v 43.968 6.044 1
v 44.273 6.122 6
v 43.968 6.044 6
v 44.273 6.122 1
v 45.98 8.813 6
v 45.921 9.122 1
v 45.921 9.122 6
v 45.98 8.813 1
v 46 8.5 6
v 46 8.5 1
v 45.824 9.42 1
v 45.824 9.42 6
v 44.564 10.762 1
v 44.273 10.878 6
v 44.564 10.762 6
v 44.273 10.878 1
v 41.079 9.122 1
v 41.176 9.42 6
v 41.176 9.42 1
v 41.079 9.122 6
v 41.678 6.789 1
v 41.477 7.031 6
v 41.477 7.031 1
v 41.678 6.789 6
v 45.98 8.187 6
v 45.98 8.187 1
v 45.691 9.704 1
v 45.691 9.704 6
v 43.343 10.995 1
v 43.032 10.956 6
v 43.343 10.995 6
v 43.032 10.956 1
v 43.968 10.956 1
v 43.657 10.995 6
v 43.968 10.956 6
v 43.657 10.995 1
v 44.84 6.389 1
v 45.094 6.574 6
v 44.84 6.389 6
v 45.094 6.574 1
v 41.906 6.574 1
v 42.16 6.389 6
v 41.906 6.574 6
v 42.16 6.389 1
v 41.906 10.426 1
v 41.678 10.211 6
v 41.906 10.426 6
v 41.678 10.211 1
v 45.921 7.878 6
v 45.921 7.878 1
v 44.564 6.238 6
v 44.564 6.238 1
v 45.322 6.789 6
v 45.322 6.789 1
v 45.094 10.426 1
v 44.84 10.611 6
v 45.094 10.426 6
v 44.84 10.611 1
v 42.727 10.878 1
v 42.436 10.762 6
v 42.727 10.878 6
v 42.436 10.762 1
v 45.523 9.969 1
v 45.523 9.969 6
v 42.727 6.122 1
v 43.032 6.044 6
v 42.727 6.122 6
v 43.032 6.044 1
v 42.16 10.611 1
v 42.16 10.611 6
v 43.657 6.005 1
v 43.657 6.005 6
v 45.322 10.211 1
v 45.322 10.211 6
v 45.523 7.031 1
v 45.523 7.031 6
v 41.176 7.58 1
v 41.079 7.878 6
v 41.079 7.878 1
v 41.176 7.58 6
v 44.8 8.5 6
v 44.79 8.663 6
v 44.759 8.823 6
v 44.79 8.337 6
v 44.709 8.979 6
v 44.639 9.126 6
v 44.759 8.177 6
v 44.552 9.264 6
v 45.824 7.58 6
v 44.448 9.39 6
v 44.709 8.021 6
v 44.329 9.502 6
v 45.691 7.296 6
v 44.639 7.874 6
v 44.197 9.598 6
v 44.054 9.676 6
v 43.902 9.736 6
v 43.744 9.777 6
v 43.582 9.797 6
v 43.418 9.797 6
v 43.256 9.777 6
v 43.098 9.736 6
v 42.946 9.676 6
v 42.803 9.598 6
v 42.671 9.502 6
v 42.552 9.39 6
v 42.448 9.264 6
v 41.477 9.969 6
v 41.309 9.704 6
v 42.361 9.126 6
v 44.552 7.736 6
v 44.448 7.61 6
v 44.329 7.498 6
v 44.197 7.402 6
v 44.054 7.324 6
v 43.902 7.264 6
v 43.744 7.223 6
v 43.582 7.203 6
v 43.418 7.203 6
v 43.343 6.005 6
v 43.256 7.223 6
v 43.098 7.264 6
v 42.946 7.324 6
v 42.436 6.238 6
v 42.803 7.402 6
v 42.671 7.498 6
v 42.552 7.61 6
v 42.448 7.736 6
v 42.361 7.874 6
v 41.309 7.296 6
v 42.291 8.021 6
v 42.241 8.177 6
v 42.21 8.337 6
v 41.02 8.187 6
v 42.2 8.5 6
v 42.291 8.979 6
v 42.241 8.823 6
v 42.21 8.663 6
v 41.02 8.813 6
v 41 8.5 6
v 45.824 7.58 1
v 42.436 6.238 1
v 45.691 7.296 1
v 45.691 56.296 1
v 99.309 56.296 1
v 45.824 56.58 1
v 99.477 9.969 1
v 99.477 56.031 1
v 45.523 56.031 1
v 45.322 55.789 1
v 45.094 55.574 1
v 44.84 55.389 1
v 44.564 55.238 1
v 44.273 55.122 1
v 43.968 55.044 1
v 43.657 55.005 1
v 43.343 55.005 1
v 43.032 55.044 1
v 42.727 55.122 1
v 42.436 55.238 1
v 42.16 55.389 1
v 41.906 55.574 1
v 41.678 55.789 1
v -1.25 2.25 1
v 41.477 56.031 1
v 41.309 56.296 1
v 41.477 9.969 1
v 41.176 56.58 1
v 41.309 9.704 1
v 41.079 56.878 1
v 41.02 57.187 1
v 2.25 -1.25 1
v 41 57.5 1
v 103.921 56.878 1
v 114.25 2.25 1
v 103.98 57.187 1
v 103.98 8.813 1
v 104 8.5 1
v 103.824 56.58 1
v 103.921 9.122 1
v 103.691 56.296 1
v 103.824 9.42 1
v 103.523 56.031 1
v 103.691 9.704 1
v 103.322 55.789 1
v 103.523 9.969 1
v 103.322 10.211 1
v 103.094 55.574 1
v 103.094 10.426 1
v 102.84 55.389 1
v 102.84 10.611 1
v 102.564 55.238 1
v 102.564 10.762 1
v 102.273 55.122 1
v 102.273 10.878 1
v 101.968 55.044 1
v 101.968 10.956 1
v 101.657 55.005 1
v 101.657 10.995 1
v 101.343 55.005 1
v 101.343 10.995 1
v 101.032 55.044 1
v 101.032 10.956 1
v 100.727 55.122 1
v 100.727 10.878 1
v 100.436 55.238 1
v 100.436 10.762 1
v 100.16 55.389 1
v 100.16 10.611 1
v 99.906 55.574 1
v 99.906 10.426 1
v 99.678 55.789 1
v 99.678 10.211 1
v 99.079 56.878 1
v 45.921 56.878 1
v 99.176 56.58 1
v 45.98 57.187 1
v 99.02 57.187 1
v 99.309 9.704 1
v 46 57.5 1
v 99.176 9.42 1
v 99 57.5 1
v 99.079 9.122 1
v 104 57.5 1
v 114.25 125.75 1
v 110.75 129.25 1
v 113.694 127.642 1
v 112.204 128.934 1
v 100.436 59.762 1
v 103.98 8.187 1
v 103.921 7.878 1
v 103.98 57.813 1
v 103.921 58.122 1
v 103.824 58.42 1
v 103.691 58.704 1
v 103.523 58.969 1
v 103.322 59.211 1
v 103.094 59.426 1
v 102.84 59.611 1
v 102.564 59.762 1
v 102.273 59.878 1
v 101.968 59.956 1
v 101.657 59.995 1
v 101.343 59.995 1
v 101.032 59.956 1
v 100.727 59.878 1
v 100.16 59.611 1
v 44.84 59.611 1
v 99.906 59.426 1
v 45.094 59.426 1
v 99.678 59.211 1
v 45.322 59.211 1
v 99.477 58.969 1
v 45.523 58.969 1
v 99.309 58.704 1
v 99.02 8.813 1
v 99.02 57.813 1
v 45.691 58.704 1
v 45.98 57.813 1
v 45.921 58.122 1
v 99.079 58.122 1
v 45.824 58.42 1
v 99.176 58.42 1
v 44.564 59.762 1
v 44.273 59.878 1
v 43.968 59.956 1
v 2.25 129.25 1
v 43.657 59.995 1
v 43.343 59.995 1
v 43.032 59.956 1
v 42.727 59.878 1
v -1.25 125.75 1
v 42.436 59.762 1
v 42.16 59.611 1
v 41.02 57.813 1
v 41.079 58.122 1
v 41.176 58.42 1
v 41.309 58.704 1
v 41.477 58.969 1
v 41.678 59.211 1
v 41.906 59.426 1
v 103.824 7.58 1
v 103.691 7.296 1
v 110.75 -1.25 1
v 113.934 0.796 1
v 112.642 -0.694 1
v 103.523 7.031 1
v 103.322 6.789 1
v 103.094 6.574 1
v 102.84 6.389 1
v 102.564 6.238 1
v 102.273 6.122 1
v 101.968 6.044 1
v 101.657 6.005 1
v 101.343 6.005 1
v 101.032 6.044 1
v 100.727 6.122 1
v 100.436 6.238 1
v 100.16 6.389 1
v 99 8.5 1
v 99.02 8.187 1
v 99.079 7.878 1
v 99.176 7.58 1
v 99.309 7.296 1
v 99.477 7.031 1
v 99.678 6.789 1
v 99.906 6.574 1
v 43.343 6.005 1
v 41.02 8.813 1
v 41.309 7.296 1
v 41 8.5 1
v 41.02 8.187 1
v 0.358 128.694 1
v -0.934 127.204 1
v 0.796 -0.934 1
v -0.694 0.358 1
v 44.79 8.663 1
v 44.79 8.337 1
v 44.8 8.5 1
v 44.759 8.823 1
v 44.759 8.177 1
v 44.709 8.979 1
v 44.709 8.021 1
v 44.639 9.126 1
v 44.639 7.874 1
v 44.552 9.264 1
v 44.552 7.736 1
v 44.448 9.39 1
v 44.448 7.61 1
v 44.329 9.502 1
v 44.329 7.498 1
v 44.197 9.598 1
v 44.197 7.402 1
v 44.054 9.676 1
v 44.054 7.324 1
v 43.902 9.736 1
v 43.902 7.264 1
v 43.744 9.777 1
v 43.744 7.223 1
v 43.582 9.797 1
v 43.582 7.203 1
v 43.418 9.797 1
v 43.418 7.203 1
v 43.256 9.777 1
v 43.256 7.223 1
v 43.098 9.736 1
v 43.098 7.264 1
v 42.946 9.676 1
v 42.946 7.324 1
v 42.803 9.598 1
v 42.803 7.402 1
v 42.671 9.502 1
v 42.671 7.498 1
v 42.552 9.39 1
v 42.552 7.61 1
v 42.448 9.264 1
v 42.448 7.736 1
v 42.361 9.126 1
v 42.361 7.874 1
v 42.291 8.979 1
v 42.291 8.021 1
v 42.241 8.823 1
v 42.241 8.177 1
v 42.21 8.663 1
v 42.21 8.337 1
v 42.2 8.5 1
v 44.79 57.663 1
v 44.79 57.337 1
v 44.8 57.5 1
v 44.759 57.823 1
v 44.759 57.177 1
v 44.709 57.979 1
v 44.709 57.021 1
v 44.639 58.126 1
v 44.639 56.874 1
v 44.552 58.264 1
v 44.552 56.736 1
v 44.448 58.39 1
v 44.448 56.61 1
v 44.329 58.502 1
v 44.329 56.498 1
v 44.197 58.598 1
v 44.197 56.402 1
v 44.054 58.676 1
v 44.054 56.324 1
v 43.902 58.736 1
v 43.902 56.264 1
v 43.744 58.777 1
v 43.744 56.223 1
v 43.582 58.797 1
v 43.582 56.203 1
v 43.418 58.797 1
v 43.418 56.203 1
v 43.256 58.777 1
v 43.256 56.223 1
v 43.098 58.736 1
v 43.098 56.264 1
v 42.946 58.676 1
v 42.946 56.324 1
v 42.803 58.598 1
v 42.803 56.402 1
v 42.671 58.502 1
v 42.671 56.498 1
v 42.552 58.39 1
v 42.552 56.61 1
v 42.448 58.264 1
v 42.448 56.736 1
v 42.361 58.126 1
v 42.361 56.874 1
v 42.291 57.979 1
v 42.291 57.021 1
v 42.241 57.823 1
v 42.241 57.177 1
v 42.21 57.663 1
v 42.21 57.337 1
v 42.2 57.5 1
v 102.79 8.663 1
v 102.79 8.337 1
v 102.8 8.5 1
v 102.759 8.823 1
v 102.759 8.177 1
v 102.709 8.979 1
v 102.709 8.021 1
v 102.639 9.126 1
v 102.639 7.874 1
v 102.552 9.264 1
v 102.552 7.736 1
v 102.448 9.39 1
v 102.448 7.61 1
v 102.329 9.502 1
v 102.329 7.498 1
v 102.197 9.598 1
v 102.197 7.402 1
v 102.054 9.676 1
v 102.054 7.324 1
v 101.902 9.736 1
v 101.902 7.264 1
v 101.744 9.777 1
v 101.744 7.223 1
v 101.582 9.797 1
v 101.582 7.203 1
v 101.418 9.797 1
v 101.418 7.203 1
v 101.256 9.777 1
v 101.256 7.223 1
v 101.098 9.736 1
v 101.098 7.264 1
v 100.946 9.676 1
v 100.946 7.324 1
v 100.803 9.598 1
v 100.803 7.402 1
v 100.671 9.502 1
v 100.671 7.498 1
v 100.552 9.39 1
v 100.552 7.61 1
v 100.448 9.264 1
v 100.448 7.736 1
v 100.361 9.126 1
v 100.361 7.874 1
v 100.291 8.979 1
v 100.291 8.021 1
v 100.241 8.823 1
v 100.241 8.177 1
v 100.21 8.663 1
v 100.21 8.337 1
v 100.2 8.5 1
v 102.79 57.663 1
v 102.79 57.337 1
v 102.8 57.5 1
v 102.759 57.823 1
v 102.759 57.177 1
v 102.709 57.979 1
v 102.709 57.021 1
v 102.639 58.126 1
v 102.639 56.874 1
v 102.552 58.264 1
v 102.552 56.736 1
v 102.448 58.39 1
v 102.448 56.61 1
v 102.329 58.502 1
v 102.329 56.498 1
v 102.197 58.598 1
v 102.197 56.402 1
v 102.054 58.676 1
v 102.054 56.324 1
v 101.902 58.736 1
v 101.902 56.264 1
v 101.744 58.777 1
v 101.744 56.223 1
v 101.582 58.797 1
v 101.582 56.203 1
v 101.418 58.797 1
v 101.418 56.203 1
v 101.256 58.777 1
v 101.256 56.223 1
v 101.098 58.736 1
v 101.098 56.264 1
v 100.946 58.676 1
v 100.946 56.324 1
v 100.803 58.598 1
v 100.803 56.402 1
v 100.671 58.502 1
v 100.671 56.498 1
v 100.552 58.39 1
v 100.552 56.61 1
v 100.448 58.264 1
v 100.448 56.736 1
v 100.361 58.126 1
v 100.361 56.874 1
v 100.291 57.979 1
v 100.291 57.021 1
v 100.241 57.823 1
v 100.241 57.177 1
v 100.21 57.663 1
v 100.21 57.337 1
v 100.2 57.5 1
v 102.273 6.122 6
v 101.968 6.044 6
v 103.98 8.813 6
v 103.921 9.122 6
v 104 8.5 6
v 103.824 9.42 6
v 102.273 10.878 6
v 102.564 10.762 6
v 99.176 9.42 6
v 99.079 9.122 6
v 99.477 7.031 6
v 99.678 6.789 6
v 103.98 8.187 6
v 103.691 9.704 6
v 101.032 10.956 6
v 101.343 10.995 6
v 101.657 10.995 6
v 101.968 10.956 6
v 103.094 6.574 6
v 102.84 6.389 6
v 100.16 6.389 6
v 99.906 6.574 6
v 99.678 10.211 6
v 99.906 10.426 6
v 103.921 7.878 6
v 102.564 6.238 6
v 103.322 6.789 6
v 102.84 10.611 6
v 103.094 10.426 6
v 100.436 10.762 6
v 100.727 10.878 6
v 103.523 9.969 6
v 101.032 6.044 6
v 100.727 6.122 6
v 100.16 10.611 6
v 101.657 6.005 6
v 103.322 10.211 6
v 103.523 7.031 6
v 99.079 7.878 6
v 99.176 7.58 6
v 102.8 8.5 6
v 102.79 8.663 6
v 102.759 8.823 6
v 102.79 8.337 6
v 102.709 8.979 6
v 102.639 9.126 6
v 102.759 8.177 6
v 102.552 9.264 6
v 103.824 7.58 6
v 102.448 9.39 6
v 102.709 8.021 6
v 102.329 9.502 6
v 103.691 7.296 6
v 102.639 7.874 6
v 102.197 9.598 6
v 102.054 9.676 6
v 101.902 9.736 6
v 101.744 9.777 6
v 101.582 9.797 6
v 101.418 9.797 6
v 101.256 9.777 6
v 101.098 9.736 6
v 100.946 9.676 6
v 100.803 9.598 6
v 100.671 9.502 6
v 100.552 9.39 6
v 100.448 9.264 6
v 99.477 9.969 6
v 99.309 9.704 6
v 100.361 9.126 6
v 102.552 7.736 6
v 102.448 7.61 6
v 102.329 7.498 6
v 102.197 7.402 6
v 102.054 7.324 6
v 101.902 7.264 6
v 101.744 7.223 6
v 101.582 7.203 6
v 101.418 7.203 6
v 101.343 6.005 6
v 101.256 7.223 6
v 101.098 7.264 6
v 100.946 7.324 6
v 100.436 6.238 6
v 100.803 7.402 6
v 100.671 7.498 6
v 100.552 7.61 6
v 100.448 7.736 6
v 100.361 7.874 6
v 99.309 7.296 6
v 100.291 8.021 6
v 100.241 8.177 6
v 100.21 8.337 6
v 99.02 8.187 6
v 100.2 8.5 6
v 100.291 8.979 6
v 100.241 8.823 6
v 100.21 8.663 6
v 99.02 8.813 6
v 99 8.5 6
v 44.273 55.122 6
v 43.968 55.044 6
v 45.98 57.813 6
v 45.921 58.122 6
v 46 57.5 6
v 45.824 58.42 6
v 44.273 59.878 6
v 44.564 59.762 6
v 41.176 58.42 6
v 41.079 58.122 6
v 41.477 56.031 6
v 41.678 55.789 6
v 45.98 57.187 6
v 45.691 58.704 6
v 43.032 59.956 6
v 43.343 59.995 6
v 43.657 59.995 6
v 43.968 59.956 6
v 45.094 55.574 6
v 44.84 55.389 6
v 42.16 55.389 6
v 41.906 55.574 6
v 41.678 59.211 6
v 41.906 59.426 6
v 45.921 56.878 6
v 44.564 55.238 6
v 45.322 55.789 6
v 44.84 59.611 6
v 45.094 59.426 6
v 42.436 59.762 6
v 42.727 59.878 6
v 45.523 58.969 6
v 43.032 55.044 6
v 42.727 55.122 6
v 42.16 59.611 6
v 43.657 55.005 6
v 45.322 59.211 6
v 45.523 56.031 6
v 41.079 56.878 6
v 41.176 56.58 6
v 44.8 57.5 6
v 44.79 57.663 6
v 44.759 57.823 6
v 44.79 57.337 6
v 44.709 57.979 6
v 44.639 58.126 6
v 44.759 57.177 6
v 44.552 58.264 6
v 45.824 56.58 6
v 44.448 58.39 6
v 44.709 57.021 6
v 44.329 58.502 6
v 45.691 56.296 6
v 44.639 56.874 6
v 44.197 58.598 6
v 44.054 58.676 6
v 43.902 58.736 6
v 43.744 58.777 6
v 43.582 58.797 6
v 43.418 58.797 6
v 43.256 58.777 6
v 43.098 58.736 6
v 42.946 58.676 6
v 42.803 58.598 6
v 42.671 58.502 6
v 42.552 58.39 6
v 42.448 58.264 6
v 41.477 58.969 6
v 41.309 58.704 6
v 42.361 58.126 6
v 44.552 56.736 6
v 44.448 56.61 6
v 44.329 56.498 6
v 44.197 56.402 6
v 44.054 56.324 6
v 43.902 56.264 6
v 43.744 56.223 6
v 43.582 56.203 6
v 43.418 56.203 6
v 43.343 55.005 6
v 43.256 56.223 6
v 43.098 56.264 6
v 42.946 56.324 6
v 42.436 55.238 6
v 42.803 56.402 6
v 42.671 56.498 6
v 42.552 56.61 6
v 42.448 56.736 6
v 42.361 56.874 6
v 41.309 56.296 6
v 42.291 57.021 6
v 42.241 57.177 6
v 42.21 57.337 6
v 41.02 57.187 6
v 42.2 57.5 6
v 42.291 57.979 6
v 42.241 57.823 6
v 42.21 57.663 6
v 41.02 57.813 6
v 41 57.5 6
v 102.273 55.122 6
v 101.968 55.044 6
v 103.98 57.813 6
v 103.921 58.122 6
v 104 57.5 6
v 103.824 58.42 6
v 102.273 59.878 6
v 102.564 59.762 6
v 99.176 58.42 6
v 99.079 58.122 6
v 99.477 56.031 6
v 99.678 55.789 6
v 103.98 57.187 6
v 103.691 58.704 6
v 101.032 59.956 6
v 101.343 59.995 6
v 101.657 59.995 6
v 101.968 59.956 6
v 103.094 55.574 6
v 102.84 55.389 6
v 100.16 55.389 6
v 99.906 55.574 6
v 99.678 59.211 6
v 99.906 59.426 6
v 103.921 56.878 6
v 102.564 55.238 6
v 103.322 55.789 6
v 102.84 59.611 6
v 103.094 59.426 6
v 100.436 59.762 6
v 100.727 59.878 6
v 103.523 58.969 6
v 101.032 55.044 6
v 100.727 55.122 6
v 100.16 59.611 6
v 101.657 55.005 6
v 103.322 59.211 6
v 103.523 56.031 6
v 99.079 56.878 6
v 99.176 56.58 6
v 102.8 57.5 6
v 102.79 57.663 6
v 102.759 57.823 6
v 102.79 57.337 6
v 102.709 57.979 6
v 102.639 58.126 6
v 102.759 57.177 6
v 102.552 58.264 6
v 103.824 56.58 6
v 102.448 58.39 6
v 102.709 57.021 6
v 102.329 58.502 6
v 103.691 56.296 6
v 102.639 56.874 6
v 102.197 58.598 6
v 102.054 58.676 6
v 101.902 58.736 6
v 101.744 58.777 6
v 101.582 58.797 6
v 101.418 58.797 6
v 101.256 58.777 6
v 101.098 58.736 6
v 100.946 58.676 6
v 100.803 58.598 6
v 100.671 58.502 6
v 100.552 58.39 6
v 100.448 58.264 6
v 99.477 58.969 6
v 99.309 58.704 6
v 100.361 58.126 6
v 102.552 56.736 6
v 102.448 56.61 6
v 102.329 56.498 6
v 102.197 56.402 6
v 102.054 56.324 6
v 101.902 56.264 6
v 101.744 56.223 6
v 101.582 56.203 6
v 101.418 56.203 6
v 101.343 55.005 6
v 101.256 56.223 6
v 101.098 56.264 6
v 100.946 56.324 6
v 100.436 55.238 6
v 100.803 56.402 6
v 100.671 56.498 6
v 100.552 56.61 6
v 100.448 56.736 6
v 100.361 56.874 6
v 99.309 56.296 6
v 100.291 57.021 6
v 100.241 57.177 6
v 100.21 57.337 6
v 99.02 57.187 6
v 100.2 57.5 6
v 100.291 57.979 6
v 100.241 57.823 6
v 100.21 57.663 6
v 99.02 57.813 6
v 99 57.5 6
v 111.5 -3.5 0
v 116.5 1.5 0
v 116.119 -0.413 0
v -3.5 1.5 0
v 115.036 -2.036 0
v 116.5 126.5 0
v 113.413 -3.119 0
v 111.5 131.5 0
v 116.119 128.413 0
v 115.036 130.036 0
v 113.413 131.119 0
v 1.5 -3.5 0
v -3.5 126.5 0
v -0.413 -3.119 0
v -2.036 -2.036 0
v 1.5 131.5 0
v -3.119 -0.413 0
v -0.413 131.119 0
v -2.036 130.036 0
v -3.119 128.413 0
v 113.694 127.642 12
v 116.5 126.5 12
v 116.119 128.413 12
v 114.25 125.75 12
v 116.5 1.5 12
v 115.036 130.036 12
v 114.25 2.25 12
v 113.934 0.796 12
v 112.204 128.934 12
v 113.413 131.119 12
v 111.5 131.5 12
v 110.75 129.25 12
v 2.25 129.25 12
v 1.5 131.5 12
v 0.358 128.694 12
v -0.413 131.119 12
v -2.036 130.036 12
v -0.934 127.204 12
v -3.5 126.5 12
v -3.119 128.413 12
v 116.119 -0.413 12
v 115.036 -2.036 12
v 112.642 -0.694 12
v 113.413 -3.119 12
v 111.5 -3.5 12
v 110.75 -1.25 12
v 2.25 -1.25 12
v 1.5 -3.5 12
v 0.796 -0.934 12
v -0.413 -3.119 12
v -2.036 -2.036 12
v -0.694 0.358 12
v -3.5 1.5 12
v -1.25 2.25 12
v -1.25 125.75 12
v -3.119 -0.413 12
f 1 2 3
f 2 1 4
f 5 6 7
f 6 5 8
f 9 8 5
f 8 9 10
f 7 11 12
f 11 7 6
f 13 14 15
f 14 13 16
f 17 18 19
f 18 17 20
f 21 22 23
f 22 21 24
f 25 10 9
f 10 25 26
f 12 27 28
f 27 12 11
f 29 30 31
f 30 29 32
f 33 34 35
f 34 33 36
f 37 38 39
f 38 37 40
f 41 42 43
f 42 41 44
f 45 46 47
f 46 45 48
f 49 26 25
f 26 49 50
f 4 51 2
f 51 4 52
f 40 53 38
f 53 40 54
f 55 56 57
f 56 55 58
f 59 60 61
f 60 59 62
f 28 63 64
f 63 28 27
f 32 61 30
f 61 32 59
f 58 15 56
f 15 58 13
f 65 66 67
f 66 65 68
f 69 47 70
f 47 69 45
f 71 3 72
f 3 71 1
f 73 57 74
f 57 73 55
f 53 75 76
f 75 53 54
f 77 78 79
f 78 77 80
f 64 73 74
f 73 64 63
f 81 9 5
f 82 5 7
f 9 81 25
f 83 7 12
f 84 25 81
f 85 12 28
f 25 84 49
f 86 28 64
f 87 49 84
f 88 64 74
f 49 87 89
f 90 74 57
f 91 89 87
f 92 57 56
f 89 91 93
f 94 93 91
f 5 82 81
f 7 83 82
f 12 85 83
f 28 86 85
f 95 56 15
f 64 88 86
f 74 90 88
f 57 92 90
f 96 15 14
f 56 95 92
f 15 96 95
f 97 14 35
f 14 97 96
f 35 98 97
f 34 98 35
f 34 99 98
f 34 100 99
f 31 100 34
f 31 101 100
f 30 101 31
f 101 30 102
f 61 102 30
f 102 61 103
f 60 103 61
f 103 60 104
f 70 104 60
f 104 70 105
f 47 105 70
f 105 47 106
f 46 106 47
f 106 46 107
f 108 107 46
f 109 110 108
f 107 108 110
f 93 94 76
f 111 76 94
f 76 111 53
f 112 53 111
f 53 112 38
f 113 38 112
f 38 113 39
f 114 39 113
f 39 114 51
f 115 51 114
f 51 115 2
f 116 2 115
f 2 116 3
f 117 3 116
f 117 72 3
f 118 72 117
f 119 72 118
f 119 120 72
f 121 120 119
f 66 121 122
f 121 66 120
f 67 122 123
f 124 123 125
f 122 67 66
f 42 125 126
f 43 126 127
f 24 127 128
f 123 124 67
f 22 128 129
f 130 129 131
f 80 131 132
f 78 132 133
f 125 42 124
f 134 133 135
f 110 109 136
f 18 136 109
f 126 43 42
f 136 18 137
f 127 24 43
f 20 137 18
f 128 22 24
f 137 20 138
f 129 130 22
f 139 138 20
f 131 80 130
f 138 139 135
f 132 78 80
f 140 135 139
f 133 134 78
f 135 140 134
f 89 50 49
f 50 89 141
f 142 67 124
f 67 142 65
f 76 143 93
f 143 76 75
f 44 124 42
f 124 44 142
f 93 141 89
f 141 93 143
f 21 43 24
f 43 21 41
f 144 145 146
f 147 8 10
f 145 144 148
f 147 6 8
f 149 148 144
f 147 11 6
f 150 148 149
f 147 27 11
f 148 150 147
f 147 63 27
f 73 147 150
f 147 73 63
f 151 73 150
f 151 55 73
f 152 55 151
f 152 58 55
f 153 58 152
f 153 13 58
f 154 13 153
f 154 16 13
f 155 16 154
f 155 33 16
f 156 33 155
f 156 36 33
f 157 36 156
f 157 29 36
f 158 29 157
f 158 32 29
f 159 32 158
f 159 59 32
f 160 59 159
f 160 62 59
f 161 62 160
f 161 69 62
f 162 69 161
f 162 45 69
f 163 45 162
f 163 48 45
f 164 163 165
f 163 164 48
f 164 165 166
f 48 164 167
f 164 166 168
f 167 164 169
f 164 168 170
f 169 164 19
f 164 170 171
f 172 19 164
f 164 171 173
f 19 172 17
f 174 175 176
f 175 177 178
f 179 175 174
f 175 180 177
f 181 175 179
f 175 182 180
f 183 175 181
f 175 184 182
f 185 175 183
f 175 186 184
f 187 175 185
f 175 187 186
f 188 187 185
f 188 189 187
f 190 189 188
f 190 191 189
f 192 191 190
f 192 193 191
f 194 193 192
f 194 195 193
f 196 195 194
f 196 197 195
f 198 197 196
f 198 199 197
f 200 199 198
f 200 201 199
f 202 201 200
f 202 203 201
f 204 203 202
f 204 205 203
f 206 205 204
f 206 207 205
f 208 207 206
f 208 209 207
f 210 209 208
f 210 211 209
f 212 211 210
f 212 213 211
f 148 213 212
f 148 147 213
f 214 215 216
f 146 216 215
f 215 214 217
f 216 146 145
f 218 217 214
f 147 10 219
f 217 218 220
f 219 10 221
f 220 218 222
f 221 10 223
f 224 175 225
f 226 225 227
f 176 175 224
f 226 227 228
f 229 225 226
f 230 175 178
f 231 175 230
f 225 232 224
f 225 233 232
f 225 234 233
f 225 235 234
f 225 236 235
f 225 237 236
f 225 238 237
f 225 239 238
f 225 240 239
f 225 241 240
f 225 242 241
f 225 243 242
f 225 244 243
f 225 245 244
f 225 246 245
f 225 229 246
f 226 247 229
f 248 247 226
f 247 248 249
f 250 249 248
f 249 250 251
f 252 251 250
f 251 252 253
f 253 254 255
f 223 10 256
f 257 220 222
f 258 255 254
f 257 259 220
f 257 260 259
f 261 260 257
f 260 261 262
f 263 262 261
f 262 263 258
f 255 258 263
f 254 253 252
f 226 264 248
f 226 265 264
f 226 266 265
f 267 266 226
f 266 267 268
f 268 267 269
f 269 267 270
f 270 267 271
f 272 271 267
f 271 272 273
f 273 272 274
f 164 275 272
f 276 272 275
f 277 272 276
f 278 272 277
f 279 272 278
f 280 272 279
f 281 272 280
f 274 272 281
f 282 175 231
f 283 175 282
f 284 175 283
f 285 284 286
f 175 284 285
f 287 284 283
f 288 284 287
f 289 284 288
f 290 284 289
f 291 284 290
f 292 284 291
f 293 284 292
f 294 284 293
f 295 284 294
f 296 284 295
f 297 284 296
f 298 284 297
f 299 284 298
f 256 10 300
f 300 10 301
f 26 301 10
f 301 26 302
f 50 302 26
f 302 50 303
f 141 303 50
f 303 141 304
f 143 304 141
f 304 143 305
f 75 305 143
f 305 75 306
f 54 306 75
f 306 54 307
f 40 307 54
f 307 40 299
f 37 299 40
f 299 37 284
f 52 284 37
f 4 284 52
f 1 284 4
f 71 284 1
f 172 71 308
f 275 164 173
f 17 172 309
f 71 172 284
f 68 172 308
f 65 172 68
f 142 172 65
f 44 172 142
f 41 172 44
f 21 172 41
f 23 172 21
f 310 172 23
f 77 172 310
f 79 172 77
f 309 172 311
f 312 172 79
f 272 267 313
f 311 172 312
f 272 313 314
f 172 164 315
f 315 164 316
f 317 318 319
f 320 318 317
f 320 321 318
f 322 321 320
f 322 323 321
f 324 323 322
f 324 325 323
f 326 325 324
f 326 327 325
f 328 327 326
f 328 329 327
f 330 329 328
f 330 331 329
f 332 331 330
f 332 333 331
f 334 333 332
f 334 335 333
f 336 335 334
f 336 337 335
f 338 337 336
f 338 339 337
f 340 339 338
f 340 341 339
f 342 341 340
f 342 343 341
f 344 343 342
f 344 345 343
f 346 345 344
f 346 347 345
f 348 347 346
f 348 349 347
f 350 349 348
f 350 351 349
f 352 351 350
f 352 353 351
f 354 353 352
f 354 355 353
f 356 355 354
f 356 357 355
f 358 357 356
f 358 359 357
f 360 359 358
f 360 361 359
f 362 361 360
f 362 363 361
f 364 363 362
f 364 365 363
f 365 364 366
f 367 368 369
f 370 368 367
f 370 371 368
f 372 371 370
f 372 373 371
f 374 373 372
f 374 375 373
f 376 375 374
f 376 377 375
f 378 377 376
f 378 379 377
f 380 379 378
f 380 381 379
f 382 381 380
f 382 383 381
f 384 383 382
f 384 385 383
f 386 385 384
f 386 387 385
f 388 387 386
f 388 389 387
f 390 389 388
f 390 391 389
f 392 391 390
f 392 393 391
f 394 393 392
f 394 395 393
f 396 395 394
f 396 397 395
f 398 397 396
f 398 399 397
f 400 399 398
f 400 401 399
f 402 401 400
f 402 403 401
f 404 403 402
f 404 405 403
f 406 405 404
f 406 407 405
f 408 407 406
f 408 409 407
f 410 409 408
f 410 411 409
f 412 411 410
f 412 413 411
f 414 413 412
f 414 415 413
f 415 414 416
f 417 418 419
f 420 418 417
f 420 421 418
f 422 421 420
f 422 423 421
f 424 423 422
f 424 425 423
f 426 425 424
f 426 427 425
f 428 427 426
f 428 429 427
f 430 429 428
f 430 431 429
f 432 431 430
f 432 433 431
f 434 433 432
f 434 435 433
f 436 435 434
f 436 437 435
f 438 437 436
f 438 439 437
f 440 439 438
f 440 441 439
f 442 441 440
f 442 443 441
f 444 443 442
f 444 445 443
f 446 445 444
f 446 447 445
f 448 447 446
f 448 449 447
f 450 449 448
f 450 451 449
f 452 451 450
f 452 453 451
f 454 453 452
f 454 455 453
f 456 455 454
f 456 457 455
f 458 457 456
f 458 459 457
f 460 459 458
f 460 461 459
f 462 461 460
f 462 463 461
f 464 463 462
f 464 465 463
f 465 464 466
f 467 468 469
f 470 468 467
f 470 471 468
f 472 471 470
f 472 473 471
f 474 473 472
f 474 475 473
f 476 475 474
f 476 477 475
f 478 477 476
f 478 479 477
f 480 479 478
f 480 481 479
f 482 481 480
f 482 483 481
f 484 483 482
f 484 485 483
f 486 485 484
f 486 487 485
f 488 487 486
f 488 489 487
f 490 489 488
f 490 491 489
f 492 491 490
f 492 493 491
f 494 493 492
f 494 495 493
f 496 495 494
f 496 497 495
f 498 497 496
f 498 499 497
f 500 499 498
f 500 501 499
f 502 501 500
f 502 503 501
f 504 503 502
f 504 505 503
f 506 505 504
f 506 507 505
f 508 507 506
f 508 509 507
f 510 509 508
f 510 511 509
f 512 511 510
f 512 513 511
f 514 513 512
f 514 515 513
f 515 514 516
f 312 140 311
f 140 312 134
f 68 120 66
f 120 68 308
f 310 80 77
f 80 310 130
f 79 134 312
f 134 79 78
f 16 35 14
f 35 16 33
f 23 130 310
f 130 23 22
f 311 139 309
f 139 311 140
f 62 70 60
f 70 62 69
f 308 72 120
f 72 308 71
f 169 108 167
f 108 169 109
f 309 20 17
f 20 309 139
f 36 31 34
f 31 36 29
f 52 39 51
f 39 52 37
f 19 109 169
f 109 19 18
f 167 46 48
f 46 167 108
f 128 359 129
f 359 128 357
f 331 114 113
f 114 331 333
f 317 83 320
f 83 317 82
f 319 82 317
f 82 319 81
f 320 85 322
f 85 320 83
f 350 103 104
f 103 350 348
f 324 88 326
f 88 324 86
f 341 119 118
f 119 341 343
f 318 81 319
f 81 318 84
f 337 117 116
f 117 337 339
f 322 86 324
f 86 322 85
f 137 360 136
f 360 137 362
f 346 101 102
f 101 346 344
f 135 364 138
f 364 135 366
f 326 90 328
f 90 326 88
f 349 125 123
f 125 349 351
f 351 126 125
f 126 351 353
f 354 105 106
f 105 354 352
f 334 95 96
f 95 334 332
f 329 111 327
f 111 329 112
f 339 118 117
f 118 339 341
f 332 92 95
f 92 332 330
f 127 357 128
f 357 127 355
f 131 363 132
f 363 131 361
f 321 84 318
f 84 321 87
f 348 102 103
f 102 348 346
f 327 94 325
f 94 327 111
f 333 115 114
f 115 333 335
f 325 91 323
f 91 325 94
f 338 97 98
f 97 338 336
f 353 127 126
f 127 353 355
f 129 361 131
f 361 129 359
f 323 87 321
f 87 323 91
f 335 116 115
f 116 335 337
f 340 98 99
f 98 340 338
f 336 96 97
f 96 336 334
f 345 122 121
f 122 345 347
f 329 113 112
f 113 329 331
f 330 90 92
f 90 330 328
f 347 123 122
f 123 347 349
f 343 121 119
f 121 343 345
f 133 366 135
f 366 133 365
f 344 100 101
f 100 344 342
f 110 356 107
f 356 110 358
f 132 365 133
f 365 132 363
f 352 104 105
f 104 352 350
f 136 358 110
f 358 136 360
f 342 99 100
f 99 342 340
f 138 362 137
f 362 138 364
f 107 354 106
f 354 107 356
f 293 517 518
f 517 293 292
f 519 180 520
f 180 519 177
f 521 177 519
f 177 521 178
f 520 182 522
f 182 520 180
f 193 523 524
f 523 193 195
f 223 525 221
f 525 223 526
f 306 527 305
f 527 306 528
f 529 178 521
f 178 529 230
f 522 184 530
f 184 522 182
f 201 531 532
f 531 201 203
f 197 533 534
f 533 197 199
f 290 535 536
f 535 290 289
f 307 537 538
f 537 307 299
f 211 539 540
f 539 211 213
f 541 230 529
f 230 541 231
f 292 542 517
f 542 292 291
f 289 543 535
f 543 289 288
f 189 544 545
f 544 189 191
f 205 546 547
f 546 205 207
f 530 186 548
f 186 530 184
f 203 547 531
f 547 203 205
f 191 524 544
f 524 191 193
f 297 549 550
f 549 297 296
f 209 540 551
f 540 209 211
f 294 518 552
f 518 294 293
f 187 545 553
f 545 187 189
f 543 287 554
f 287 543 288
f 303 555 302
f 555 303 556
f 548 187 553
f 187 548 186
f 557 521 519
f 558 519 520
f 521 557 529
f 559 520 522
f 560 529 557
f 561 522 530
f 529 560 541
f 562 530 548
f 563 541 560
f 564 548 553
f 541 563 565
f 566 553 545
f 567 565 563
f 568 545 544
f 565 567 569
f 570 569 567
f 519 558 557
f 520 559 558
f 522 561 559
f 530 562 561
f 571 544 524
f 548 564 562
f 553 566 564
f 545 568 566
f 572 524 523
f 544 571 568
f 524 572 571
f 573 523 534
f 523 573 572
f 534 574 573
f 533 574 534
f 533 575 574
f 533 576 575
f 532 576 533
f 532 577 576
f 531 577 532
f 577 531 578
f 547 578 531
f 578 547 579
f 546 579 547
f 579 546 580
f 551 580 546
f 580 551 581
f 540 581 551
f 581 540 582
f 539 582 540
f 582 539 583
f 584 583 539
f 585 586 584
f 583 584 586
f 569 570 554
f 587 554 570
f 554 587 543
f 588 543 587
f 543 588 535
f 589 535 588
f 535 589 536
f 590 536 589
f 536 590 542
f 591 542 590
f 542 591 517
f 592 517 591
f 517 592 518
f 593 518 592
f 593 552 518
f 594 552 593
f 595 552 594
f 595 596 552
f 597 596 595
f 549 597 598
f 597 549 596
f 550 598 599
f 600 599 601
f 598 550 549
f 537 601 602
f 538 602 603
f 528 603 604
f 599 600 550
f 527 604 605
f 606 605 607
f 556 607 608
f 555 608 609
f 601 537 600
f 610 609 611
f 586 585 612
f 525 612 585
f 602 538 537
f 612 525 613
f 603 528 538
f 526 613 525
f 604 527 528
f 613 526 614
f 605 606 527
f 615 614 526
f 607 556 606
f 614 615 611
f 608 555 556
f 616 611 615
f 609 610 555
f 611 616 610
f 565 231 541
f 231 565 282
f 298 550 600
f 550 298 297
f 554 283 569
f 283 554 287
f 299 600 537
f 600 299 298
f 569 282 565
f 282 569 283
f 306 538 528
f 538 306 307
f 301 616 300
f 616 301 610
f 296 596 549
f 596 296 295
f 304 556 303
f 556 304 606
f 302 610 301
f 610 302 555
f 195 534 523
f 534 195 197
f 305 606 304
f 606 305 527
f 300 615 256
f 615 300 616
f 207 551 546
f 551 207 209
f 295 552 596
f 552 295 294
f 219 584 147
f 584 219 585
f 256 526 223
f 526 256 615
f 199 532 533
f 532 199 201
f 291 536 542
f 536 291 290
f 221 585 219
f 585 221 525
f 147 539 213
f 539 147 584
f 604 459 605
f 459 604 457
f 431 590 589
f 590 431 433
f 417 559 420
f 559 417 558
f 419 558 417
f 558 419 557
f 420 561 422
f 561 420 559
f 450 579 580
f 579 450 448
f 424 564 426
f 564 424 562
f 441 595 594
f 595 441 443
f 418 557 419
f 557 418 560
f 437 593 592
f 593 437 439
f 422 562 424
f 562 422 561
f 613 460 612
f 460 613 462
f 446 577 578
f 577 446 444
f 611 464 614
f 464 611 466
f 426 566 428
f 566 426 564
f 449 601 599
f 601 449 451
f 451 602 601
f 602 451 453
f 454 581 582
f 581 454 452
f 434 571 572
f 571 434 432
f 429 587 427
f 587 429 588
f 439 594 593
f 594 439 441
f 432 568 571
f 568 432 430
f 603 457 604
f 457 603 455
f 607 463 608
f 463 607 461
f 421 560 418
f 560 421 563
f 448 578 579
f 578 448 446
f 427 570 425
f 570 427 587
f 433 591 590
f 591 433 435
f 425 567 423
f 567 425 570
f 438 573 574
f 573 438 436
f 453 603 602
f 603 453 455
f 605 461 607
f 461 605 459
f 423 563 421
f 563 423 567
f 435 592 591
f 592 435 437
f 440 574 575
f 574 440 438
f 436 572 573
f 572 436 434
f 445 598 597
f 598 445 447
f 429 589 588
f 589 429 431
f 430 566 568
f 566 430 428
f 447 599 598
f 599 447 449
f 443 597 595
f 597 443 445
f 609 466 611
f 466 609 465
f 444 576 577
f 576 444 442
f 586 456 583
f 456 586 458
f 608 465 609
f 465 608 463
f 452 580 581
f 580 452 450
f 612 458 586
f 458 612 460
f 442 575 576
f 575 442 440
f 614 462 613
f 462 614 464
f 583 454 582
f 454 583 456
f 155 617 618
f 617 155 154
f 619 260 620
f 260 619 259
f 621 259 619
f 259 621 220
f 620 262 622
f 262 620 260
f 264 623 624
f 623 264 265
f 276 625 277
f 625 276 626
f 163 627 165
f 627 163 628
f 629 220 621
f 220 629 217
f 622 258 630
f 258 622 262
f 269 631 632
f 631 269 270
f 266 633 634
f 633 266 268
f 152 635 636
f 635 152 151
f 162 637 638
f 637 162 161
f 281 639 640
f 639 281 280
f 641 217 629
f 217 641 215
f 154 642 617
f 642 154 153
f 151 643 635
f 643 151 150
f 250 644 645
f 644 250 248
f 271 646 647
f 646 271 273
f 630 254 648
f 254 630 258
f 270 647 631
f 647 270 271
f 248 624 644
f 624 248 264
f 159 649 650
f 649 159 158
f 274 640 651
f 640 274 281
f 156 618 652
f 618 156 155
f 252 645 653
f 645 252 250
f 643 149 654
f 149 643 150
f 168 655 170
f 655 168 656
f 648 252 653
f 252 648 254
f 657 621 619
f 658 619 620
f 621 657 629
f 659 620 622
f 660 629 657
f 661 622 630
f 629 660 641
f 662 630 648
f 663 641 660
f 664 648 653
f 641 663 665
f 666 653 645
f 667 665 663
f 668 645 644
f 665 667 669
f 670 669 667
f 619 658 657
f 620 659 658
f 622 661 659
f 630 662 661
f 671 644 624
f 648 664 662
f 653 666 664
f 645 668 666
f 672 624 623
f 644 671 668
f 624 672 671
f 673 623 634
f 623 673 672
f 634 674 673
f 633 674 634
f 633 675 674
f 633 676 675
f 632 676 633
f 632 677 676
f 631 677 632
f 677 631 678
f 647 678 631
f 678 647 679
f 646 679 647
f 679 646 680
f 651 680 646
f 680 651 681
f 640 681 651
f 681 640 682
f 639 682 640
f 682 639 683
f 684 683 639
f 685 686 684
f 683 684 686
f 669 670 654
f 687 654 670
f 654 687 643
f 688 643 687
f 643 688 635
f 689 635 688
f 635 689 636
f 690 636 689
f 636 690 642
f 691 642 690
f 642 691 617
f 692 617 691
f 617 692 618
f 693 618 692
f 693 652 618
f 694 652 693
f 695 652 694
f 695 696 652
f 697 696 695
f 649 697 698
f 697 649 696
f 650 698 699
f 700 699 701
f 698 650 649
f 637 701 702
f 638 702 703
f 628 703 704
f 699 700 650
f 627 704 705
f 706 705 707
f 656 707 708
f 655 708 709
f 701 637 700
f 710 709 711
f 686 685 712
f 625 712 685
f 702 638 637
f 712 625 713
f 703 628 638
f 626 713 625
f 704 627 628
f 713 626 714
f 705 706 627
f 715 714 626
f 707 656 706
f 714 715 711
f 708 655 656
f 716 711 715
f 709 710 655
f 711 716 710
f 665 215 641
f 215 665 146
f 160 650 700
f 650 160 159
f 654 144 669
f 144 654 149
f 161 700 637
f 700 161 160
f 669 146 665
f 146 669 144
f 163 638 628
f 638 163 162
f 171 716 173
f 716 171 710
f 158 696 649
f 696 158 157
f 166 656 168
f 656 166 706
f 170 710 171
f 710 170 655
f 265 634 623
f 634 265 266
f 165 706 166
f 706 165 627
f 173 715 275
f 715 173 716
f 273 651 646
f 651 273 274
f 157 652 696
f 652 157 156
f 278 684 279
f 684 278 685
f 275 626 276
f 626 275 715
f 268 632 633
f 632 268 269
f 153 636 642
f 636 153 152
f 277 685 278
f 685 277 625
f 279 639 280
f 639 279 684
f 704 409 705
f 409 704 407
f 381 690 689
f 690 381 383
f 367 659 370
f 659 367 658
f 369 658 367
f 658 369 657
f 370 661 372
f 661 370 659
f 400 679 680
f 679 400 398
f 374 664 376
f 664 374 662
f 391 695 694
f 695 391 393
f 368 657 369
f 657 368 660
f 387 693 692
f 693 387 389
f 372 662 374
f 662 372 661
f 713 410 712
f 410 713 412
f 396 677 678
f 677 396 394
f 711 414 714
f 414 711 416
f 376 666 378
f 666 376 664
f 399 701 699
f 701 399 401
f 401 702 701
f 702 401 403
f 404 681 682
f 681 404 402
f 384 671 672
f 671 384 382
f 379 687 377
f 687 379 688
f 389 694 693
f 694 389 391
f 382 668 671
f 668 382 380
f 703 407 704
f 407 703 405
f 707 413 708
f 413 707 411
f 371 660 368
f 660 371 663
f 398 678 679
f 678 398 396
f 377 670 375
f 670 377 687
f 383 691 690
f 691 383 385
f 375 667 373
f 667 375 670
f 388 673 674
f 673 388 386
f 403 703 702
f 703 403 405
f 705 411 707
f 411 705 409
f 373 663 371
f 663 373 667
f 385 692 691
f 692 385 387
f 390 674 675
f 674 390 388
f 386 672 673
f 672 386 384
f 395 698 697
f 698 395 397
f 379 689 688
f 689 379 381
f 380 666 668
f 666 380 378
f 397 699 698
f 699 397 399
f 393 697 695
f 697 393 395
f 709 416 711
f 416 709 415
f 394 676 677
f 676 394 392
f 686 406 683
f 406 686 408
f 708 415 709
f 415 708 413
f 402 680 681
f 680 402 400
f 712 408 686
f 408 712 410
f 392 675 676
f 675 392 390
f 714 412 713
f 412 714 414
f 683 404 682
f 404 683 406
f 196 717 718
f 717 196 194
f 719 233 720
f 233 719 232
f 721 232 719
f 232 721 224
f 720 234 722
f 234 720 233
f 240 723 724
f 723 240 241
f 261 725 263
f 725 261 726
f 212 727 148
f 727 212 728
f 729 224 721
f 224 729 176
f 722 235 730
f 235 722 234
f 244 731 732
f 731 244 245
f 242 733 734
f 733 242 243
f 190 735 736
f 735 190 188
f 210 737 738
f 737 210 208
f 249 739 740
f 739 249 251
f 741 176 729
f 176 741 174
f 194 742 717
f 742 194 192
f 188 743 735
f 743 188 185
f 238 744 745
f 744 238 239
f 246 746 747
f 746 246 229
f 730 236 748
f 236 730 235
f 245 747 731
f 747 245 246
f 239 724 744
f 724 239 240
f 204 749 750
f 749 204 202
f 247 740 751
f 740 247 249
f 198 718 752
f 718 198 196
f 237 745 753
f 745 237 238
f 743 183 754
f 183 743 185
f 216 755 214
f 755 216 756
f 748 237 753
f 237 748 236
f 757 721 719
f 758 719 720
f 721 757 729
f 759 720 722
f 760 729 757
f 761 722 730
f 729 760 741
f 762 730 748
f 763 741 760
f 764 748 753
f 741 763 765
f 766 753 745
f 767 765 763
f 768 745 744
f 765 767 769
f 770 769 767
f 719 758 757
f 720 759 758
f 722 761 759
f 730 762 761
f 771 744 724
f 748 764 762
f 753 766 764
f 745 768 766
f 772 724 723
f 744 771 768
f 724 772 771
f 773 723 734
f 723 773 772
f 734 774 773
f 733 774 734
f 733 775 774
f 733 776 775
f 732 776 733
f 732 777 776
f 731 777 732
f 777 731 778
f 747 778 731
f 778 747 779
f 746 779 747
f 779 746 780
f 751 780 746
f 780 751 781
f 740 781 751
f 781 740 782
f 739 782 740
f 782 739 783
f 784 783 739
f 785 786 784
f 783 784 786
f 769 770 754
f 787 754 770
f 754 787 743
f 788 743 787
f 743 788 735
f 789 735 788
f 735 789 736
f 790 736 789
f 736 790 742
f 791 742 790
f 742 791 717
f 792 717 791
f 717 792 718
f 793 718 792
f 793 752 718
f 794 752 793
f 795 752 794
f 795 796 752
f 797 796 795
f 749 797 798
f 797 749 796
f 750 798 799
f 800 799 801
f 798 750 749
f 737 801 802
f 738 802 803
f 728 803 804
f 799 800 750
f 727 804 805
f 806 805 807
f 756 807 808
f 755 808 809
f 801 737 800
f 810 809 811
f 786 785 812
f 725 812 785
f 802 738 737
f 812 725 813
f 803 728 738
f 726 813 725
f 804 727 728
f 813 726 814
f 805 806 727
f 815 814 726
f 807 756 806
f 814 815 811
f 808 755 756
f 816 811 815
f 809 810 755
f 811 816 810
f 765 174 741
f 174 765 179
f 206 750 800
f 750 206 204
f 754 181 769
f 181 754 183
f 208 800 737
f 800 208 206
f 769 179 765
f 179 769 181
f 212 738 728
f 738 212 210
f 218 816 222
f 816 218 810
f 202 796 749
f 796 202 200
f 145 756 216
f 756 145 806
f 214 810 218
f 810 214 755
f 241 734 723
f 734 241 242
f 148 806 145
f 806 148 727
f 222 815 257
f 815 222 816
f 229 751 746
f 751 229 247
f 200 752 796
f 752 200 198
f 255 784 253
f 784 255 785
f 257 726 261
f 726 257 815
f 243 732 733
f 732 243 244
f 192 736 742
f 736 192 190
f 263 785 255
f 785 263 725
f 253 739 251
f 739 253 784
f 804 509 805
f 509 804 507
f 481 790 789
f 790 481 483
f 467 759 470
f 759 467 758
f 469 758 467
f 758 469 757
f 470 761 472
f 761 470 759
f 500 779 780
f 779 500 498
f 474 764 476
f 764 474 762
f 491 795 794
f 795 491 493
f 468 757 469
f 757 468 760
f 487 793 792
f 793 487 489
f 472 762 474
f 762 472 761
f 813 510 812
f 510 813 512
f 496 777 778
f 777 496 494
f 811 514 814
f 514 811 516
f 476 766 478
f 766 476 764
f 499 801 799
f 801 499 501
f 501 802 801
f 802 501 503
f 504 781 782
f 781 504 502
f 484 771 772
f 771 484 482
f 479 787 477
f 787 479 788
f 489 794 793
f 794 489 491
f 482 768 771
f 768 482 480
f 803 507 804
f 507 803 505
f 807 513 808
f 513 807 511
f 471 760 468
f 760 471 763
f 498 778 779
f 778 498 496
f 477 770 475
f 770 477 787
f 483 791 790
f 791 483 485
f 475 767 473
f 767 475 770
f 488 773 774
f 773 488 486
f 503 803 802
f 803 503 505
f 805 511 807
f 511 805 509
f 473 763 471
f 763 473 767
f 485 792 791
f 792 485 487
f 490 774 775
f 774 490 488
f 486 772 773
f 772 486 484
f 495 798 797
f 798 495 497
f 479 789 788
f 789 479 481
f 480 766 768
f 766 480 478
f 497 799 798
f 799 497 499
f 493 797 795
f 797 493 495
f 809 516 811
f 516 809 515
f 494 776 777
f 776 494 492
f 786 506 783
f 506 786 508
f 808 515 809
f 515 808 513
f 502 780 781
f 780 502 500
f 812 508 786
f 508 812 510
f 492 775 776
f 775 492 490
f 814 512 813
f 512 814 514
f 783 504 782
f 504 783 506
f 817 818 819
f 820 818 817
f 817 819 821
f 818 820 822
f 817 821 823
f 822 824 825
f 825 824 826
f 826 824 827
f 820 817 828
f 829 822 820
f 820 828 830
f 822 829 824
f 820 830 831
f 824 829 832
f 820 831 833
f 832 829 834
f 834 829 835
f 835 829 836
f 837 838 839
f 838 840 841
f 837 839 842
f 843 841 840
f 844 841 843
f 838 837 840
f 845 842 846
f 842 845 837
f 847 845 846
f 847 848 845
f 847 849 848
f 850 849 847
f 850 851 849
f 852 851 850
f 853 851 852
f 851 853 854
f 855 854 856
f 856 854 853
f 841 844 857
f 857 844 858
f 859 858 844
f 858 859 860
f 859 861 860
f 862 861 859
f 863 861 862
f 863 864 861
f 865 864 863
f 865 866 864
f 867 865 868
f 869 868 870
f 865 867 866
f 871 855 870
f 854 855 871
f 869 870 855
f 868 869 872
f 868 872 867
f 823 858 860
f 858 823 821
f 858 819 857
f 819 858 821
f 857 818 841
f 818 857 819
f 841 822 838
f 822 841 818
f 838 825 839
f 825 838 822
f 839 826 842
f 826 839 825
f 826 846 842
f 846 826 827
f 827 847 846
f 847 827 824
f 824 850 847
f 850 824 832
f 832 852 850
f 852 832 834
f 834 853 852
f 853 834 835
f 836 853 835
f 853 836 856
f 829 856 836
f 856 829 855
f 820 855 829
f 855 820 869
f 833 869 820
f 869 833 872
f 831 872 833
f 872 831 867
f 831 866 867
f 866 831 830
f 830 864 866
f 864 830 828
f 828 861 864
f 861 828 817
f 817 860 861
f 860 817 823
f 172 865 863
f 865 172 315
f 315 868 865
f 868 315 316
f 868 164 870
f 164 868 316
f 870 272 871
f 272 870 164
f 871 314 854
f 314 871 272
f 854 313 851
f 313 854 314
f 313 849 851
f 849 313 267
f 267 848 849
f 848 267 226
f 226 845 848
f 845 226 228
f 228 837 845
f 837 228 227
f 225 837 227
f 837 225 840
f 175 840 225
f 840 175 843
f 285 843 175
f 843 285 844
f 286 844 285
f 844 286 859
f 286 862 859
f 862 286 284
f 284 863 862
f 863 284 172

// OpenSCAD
box = [110, 125, 12];
corner_r = 5;
wall_thickness = 1.5;
bottom_thickness = 1;
post_offset = 5;
screw_size = 2.6;
pi_offs = [20,5];

module cpus() {
  translate([pi_offs.x,pi_offs.y,8.5])
  import("rPi2_01.stl");
  // breadboard
  translate([5, 70, 5])
  cube([82, 55, 10]);
  // motor controllers
  translate([5, 70+55/2-10, 15])
  cube([100, 20, 2]);
}
*cpus();

linear_extrude(box.z)
translate([wall_thickness, wall_thickness])
difference() {
  offset(corner_r) square([box.x, box.y]);
  offset(corner_r-wall_thickness)
  translate([wall_thickness/2, wall_thickness/2])
    square([box.x-wall_thickness, box.y-wall_thickness]);
}

linear_extrude(bottom_thickness)
translate([wall_thickness, wall_thickness])
offset(corner_r) square([box.x, box.y]);

posts=[[23.5,3.5],[81.5,3.5],[23.5,52.5],[81.5,52.5]];
for (p = posts) {
  translate([pi_offs.x+p.x,pi_offs.y+p.y,bottom_thickness]) difference() {
    $fn=50;
    cylinder(h=post_offset, r=2.5);
    cylinder(h=post_offset+1, d=screw_size);
  }
}
